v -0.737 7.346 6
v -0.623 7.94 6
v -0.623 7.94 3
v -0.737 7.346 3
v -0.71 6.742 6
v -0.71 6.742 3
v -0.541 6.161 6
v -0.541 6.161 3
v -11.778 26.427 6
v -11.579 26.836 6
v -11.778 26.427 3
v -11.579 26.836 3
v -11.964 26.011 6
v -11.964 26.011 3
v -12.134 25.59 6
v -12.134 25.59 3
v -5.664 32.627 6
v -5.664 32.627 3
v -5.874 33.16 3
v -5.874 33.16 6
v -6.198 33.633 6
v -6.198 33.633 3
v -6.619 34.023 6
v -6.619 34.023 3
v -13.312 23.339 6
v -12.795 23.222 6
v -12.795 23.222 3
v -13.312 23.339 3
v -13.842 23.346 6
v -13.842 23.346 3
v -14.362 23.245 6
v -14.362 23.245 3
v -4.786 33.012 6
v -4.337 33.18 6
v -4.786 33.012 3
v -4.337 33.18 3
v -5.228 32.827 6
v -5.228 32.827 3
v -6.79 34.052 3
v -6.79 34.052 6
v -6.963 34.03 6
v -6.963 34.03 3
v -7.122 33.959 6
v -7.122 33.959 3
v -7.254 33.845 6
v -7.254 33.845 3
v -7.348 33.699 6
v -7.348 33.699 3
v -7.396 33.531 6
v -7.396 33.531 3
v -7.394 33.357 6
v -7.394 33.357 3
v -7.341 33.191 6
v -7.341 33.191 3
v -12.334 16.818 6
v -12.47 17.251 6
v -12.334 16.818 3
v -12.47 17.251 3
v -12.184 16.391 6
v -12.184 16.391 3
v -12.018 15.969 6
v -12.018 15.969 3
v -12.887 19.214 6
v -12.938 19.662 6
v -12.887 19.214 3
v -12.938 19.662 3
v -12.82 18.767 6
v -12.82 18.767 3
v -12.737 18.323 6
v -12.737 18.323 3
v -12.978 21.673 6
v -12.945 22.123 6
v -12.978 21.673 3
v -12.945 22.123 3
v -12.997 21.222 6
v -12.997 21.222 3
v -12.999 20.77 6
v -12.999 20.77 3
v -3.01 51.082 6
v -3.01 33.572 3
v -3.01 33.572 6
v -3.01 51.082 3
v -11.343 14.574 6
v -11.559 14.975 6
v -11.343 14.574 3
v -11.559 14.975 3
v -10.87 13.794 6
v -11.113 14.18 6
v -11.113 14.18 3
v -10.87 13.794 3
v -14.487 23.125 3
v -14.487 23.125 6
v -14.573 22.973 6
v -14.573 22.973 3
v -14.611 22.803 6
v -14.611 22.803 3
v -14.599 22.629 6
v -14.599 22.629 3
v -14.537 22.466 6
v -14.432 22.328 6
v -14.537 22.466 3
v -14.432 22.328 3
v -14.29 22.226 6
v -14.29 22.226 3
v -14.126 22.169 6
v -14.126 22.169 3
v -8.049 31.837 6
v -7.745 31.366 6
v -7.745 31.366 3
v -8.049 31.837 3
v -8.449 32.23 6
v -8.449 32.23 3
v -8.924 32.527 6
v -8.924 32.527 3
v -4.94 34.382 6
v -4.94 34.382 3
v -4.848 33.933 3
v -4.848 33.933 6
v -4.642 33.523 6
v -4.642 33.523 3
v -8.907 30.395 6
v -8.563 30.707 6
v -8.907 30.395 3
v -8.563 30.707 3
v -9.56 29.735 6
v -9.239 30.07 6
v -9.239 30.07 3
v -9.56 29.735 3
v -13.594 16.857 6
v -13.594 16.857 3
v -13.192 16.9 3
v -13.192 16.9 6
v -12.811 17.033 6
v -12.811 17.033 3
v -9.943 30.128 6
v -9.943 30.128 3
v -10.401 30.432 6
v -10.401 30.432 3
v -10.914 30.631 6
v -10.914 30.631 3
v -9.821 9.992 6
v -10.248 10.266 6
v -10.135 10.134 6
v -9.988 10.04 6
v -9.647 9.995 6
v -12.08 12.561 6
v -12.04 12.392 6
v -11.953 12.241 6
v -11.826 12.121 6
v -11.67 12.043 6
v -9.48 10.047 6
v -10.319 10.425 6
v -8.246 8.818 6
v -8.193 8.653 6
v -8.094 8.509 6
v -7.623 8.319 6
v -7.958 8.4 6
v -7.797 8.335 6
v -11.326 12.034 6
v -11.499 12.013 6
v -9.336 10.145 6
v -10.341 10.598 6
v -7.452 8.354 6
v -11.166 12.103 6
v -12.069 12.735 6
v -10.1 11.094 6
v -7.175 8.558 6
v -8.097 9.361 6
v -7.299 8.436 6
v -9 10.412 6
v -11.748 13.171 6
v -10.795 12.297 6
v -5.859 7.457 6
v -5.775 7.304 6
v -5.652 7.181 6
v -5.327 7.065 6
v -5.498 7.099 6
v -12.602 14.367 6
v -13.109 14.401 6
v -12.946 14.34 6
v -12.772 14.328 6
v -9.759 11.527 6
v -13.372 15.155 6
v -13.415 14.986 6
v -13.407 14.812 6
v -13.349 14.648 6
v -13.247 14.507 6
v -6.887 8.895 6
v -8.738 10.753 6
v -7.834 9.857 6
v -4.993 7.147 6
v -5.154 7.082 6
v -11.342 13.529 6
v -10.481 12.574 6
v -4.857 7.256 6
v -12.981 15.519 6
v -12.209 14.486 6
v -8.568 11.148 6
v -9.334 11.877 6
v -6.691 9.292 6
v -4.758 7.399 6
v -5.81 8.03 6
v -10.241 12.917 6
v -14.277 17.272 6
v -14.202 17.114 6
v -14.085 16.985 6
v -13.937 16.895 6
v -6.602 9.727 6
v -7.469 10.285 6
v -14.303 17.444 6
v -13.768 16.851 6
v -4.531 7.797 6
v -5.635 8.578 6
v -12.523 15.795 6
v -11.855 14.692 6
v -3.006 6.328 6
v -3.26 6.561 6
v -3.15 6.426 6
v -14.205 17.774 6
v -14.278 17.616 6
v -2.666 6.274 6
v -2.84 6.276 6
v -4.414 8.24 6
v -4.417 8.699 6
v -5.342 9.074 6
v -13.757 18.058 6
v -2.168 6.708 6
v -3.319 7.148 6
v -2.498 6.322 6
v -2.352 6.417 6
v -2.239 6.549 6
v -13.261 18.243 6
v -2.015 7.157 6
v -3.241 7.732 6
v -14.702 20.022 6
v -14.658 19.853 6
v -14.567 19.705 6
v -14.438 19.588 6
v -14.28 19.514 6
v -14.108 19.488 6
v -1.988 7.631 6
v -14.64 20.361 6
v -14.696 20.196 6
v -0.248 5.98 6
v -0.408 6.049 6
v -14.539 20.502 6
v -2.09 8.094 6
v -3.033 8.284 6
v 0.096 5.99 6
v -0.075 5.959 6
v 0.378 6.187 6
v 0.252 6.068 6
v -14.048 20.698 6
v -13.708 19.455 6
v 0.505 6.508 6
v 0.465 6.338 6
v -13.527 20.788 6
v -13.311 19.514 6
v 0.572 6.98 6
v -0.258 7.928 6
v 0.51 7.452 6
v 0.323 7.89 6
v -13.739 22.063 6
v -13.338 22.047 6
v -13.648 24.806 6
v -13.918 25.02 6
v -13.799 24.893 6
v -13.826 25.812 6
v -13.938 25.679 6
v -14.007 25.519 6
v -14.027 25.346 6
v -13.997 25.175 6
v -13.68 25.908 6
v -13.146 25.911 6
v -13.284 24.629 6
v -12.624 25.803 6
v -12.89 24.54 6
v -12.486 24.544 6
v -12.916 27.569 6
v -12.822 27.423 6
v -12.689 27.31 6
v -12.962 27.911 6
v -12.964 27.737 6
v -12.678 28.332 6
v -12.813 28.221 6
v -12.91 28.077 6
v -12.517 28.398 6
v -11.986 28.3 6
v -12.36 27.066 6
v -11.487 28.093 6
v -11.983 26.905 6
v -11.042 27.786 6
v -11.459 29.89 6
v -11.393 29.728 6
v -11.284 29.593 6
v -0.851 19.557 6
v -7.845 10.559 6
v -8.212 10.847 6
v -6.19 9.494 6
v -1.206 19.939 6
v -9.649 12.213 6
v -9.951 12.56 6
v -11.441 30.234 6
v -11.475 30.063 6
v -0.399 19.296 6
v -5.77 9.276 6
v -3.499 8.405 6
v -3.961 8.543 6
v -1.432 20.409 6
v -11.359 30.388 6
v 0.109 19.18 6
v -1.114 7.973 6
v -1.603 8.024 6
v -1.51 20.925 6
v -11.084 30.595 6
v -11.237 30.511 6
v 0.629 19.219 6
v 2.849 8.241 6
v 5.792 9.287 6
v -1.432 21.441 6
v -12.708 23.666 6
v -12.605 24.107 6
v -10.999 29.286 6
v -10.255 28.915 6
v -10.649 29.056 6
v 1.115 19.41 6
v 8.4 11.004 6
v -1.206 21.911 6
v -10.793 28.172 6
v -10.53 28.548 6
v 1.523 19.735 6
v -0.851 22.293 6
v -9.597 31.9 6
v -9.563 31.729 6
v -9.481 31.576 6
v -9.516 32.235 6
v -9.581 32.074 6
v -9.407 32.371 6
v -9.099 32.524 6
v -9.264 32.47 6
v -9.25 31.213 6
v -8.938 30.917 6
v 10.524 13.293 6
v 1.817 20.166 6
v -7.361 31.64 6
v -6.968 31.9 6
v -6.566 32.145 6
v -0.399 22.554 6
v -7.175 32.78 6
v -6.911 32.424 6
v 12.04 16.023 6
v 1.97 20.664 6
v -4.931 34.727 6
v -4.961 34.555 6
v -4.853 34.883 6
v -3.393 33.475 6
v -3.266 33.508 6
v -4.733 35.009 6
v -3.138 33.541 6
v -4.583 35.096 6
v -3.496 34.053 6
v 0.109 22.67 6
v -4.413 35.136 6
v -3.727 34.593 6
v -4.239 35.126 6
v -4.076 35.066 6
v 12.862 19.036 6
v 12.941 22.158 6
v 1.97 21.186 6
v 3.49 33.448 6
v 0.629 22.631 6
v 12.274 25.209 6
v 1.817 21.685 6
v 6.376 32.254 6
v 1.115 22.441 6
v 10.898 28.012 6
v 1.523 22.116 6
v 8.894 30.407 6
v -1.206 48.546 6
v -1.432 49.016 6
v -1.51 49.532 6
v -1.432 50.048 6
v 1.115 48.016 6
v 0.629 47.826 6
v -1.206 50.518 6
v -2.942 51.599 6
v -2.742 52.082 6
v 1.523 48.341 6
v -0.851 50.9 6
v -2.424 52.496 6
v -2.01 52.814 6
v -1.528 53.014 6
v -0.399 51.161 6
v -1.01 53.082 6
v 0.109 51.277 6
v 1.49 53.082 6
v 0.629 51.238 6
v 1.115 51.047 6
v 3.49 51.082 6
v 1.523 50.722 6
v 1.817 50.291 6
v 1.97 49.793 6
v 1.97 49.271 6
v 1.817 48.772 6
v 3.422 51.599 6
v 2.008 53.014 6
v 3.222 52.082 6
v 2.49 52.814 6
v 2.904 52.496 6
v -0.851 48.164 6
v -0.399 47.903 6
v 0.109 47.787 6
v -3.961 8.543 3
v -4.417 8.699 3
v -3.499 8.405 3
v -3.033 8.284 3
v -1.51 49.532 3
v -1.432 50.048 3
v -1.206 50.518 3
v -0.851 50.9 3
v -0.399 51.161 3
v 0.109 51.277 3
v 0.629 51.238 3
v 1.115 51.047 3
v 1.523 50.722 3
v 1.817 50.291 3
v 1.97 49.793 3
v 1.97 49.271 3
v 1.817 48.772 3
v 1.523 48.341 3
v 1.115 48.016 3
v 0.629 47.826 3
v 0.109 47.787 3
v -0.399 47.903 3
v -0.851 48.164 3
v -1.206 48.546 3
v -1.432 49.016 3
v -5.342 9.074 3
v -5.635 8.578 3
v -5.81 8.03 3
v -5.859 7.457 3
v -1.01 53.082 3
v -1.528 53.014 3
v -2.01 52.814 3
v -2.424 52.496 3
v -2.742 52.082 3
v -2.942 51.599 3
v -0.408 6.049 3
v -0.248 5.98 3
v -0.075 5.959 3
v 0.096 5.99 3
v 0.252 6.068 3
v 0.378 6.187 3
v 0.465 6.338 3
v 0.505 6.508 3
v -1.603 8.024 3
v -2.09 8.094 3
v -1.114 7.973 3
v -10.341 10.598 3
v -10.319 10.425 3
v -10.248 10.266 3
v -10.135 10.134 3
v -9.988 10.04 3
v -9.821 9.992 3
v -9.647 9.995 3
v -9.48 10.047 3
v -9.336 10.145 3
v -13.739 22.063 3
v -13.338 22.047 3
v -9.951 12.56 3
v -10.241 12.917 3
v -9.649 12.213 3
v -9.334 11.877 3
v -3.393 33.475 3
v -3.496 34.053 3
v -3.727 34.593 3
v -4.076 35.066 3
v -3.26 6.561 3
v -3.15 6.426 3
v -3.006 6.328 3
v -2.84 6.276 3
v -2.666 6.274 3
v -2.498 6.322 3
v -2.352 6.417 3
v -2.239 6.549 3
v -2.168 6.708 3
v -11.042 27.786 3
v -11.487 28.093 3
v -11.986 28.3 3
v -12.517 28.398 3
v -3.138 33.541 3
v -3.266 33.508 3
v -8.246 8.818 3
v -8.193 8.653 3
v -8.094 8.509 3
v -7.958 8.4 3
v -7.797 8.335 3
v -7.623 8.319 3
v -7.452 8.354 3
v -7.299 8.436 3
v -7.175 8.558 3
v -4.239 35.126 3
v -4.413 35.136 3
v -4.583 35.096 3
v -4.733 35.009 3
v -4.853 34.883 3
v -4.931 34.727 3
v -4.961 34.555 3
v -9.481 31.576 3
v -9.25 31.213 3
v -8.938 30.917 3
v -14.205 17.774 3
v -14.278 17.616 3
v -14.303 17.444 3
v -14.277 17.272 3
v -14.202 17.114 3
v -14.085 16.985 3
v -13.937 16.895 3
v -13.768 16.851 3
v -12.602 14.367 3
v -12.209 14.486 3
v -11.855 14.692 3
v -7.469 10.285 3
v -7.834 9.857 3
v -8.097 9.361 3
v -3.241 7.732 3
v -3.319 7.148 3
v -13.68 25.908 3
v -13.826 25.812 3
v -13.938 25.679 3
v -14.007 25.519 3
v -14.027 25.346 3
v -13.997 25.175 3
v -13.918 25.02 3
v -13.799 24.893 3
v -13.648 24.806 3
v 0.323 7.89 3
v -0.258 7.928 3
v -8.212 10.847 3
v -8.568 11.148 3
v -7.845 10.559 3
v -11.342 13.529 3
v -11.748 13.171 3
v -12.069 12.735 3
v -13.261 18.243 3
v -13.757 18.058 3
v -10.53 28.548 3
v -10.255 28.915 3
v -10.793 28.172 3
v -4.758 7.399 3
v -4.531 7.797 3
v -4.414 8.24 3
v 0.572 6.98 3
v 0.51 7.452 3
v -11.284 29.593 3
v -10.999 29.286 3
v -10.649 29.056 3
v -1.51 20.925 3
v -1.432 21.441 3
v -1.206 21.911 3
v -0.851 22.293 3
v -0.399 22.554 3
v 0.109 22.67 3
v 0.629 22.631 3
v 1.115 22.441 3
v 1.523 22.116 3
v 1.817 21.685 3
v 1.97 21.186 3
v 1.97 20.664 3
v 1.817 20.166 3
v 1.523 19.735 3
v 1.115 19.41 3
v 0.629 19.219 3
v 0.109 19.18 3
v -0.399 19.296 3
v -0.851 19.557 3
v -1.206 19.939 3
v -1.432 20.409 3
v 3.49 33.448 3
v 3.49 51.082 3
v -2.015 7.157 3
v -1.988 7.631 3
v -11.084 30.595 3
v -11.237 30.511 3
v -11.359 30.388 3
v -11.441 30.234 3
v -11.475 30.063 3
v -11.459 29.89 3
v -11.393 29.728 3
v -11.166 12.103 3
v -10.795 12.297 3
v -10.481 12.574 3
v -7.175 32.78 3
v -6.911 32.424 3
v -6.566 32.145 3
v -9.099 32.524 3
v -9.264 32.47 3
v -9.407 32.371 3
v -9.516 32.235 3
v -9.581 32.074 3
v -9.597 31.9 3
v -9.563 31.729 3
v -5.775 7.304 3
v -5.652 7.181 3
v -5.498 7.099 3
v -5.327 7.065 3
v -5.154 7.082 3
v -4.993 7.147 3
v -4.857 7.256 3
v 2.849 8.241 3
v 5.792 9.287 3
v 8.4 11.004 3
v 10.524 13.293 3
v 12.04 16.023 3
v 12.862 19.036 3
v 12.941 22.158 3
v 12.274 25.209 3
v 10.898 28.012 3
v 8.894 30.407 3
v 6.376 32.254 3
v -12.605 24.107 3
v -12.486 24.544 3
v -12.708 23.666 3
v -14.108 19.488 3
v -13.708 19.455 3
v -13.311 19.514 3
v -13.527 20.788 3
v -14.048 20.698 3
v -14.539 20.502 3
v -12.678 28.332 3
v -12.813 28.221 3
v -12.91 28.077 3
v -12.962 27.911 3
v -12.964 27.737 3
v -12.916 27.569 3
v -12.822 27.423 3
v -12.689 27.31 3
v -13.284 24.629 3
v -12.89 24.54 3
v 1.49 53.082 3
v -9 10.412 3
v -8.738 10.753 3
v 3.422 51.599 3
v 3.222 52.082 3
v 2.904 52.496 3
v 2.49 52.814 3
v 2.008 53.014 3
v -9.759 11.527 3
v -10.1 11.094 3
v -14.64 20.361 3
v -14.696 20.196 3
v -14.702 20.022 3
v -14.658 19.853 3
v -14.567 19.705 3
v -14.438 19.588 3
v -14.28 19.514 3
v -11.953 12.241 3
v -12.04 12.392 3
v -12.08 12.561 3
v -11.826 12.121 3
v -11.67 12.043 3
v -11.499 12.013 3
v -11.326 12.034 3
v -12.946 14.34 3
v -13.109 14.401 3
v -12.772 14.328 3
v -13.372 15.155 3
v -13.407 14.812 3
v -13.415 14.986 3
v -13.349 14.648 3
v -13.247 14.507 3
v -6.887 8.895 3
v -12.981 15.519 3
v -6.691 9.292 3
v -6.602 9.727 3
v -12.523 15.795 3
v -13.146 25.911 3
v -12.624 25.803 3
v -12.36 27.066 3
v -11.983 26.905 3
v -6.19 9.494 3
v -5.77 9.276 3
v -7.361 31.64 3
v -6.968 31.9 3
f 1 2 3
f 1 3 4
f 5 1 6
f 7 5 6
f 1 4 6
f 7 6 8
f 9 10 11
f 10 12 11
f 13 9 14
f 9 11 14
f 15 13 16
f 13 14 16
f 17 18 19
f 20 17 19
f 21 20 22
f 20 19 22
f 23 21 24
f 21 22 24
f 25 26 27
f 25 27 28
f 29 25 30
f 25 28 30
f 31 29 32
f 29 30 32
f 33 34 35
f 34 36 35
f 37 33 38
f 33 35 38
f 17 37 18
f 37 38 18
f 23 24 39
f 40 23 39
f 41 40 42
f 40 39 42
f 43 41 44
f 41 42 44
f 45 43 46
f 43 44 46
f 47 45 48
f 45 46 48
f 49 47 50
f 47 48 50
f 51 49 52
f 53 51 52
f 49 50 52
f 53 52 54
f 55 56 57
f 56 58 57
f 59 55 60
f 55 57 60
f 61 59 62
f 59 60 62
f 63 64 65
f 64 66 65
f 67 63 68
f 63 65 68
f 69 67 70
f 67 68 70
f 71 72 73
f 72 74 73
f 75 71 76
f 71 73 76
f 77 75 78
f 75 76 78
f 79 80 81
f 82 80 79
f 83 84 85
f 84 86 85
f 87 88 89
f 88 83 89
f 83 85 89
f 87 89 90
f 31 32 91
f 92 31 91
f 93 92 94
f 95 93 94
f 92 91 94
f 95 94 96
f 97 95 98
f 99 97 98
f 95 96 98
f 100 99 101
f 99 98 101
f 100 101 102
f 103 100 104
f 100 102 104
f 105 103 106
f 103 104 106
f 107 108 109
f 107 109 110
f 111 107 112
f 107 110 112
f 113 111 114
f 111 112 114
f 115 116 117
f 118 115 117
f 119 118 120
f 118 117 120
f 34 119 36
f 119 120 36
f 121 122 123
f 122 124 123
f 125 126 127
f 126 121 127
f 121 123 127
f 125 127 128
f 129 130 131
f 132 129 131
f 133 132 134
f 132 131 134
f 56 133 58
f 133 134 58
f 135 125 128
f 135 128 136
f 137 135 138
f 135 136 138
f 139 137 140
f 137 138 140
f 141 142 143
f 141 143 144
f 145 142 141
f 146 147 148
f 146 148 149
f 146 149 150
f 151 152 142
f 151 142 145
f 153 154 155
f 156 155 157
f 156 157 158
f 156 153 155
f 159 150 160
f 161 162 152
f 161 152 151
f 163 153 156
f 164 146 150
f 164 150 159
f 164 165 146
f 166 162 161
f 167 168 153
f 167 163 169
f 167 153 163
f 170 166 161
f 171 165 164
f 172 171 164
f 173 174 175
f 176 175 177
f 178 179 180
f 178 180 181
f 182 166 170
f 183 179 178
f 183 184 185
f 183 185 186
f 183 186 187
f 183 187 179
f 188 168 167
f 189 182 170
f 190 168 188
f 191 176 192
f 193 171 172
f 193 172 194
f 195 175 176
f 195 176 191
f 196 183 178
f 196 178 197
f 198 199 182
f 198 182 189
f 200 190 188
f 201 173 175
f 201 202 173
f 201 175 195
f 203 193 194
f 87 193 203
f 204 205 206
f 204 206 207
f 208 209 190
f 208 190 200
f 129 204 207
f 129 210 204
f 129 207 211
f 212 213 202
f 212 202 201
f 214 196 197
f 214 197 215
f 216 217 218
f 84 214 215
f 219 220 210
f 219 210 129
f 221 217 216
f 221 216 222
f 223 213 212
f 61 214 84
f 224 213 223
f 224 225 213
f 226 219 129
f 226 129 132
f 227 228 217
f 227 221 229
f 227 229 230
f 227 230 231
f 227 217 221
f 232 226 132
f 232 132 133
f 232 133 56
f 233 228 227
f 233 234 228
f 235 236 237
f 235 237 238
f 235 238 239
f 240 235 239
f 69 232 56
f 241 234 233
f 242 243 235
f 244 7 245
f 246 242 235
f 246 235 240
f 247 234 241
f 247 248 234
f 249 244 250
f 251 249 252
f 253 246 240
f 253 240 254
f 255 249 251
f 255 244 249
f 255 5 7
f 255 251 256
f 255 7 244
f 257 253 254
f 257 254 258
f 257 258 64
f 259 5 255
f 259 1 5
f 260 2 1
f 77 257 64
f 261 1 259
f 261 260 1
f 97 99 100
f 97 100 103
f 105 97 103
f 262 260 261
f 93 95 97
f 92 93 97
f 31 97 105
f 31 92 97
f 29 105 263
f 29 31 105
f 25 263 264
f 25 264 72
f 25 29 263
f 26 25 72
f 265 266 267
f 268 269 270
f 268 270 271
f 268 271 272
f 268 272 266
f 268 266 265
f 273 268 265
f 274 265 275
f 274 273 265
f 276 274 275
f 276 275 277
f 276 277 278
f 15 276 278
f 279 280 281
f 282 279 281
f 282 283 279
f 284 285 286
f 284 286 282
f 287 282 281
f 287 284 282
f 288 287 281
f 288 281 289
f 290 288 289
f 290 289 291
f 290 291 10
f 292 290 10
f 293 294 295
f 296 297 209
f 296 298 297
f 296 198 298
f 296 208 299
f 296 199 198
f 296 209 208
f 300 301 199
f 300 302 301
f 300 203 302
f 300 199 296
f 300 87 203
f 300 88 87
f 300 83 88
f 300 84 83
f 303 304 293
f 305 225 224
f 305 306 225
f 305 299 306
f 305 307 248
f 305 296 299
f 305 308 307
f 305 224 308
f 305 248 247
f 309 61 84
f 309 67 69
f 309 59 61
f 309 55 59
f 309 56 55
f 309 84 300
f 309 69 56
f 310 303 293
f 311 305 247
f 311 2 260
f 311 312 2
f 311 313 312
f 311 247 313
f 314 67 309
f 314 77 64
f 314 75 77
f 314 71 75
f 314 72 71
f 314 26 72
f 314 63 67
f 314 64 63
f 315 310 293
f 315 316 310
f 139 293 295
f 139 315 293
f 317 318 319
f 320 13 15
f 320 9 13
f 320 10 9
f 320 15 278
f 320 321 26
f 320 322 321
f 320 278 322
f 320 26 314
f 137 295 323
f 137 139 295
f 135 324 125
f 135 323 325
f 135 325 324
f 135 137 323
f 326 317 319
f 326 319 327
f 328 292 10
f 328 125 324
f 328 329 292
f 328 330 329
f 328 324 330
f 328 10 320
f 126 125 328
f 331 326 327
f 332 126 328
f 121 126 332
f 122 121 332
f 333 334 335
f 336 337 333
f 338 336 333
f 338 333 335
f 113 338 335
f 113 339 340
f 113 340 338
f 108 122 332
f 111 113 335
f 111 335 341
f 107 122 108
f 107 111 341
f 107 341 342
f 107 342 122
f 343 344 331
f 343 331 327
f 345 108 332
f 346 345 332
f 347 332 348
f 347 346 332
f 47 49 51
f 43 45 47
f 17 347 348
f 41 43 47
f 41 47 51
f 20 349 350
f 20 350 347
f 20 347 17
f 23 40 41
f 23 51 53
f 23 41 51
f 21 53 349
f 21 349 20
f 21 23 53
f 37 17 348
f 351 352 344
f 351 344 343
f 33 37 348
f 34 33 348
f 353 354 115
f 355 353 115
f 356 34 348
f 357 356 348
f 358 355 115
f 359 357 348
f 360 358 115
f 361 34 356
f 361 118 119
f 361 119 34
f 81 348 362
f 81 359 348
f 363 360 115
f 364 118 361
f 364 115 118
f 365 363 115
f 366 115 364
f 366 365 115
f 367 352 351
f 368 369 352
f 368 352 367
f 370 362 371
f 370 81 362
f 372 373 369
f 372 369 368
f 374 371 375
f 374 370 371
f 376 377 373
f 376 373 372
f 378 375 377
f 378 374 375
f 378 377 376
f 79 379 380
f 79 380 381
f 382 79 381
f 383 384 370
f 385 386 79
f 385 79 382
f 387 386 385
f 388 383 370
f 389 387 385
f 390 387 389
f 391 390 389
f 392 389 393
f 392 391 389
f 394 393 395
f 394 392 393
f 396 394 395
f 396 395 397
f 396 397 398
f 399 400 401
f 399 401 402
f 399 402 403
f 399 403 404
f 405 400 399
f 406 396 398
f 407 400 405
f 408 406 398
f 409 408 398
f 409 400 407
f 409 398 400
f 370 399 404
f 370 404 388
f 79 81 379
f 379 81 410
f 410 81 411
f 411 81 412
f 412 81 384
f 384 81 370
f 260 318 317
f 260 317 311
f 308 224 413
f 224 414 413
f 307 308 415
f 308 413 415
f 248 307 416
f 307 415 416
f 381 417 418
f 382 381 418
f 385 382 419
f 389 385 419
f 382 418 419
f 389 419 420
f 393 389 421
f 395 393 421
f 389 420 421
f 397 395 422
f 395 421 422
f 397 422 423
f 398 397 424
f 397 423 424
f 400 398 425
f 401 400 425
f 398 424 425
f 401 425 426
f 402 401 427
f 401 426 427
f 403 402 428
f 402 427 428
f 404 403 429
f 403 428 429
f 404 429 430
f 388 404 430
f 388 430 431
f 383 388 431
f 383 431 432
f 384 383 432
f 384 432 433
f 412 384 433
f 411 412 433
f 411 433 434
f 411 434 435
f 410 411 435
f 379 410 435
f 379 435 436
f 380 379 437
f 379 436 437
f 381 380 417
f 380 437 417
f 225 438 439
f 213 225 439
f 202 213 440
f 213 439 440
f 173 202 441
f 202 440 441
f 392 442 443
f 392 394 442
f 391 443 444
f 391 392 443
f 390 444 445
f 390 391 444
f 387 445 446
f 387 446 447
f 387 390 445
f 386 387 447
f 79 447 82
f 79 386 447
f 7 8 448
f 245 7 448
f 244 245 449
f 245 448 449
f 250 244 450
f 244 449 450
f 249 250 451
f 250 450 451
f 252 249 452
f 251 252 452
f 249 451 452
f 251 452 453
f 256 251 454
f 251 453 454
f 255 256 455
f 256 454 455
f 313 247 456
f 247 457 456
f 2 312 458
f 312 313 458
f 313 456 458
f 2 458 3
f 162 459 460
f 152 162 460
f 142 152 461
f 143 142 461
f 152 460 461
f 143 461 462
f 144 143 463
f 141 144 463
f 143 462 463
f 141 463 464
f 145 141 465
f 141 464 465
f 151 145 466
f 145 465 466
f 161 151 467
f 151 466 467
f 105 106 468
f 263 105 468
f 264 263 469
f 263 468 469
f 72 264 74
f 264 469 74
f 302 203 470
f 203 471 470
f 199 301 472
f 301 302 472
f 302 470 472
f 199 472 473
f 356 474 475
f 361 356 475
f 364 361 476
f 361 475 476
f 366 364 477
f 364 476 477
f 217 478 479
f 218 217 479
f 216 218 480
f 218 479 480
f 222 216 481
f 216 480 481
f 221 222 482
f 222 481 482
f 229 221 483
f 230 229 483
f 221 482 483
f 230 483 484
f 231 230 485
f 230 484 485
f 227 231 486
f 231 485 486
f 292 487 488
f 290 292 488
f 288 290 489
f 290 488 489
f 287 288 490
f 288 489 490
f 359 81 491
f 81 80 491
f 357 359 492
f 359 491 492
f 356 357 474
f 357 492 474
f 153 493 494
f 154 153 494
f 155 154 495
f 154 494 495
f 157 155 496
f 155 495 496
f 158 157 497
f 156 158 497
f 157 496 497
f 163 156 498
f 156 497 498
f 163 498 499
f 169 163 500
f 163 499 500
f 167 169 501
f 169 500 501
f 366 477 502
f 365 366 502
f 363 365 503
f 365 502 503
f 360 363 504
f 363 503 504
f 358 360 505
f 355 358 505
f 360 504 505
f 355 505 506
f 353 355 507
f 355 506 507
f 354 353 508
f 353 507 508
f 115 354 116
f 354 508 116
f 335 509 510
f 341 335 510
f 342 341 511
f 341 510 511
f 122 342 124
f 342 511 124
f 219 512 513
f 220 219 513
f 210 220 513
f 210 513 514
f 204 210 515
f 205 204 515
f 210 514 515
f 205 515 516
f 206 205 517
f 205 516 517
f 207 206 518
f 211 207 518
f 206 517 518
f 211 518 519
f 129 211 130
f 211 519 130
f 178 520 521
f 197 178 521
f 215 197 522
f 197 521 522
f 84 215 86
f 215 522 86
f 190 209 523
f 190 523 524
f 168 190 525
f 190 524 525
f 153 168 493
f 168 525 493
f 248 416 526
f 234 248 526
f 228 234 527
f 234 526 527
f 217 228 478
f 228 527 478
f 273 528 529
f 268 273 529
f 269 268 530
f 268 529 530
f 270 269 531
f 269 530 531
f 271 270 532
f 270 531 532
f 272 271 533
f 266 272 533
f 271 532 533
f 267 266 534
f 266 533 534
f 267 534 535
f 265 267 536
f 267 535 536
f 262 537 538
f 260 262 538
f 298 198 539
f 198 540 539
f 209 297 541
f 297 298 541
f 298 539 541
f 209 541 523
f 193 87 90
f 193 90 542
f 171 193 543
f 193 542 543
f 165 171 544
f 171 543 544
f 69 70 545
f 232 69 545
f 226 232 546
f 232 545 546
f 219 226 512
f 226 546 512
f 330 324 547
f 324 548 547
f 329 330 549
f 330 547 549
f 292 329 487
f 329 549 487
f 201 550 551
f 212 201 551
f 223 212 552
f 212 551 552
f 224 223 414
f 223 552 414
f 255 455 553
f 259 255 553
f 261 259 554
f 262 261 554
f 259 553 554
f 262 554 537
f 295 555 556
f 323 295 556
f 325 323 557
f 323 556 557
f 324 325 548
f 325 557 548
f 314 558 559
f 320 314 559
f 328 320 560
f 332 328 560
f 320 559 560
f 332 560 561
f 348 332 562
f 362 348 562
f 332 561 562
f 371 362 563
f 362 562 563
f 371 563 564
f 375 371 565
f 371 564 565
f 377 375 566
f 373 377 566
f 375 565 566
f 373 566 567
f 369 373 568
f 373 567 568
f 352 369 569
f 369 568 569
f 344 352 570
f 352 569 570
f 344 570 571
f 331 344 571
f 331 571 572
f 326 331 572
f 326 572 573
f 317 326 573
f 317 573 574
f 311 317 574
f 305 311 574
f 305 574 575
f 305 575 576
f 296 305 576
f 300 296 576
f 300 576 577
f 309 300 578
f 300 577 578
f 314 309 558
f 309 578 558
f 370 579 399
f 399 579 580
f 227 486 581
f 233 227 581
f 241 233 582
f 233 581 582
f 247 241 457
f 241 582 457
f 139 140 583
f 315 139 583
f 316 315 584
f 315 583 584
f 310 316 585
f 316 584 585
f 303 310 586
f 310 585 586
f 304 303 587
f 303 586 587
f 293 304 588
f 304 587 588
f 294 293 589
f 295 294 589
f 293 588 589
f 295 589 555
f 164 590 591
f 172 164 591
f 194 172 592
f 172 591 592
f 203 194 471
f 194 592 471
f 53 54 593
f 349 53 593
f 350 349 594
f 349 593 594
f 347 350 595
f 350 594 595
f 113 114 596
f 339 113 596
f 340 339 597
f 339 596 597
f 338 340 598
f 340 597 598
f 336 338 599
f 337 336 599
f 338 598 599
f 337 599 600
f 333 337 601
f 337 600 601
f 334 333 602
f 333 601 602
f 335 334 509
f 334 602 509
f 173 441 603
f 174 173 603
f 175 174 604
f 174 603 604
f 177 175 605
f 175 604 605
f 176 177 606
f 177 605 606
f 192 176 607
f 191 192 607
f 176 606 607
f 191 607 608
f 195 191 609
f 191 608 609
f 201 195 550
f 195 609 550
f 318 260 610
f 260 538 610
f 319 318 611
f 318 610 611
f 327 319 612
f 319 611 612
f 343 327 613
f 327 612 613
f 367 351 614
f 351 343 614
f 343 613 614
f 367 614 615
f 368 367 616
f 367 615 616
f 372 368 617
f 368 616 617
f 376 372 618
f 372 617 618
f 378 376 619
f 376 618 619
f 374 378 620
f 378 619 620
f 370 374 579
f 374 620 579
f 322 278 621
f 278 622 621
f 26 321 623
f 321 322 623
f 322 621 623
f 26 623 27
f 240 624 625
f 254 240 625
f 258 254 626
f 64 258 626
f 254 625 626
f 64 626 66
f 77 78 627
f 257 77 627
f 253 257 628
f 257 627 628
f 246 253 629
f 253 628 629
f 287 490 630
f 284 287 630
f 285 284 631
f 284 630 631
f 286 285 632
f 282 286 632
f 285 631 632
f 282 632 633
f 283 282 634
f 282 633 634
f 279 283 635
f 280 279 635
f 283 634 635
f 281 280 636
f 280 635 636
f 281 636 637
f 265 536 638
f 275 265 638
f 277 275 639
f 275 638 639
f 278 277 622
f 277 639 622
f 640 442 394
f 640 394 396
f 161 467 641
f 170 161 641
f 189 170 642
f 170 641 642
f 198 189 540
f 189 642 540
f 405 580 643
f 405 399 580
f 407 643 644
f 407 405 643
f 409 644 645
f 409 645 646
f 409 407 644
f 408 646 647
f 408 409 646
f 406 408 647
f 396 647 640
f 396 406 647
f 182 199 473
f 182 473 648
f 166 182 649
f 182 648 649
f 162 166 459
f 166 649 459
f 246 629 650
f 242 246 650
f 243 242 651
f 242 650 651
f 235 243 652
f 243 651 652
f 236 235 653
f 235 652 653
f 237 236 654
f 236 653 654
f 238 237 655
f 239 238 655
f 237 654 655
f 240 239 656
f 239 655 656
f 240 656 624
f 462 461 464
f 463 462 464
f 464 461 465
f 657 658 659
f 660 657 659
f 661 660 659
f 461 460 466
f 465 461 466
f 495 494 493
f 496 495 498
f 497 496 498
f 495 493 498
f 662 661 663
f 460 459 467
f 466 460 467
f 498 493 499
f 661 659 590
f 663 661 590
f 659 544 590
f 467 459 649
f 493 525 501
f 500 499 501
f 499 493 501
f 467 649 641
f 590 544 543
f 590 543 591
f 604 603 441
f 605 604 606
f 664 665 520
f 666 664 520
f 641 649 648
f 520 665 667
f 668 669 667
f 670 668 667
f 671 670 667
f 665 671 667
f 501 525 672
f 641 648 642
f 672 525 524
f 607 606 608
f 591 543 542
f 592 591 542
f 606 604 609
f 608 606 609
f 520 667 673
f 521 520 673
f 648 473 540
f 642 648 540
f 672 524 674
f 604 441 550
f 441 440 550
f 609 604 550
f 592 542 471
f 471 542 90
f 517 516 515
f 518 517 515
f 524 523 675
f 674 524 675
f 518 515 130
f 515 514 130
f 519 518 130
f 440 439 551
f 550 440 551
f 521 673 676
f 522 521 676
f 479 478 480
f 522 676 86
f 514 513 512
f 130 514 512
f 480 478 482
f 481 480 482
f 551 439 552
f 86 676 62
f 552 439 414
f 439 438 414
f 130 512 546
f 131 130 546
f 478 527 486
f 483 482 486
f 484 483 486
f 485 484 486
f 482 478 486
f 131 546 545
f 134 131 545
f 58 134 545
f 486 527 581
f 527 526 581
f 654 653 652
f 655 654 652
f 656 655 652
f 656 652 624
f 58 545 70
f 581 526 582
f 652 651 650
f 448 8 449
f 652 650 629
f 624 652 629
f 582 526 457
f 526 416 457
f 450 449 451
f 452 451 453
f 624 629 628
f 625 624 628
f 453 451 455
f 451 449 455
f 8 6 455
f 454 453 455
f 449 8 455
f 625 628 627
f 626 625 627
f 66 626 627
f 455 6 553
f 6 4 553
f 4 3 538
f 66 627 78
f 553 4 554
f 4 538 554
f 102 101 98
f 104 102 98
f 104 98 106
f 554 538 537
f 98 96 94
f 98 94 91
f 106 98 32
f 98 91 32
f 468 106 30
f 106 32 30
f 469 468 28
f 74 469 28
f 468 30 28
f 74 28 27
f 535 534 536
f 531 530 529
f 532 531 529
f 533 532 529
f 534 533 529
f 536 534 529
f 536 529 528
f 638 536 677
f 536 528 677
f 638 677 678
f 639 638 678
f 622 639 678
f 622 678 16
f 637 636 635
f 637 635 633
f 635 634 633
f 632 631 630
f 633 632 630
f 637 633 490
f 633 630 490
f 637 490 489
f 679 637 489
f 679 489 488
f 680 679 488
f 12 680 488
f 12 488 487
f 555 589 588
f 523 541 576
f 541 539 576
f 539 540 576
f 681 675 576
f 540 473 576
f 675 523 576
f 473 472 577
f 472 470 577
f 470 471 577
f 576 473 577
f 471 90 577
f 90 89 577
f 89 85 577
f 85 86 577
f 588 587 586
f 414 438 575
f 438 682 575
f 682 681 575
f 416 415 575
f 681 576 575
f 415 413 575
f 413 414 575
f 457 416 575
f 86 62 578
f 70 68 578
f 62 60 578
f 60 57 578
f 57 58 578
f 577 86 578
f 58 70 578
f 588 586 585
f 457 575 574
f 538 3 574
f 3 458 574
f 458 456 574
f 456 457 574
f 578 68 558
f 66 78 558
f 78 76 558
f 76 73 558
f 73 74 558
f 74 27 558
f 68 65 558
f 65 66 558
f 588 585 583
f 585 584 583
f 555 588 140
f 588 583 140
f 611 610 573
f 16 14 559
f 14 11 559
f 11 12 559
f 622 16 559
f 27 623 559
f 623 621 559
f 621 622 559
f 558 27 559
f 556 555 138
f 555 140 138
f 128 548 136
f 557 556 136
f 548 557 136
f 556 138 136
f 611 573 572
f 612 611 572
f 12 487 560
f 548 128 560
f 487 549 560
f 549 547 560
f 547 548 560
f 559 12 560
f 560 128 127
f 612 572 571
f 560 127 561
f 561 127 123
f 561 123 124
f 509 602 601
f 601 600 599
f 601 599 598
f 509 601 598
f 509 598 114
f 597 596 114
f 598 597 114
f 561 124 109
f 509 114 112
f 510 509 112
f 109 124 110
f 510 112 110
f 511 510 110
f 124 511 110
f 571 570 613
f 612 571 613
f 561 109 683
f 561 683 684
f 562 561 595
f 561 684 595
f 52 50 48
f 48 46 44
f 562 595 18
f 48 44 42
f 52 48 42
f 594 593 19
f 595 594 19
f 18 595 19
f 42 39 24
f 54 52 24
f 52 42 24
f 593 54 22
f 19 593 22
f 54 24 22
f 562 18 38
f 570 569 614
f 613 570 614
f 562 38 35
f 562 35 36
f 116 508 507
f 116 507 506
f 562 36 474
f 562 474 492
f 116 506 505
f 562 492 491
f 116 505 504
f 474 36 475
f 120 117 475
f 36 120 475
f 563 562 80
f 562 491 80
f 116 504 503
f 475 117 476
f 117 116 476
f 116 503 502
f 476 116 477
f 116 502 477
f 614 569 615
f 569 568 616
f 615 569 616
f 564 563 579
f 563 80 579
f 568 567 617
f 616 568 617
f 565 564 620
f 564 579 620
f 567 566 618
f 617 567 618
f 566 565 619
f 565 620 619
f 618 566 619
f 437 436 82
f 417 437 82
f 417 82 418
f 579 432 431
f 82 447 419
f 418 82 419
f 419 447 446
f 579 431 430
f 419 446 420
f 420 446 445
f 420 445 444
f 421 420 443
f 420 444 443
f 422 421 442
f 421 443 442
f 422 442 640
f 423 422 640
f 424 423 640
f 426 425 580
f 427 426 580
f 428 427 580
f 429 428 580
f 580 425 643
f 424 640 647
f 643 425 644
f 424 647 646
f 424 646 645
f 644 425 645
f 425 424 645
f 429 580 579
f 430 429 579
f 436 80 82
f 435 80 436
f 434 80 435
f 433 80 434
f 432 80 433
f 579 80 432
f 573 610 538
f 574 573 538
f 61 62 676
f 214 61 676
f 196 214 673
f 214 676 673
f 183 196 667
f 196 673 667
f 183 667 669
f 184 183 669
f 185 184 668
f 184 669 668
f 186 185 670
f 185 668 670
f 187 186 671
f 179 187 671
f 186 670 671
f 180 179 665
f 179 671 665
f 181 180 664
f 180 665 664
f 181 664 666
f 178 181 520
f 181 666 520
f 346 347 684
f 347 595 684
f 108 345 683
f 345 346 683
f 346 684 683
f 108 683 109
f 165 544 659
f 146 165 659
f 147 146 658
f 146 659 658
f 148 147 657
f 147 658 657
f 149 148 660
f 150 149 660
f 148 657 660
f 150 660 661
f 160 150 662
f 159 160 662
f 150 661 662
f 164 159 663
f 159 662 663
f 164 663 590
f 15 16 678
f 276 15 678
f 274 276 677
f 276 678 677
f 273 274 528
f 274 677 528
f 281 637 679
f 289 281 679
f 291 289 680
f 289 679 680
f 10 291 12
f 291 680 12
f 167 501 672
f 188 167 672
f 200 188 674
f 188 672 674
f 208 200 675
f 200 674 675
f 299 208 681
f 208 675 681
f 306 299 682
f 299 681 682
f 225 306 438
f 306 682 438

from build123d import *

# Parameters (mm, degrees)
SKETCH5_R           = 13
BOSS_EXTRUDE3_DEPTH = 3
SKETCH6_W           = 6.5
SKETCH6_H           = 20
BOSS_EXTRUDE4_DEPTH = 3
BOSS_EXTRUDE5_DEPTH = 3
SKETCH9_R           = 1.75
CUT_EXTRUDE1_DEPTH  = 3
FILLET1_R           = 2


with BuildPart() as part:
    # Sketch5 → Boss-Extrude3 (new body)
    with BuildSketch(Plane.XY.offset(3)):
        with Locations((0, 20.92523633)):
            Circle(SKETCH5_R)
    extrude(amount=BOSS_EXTRUDE3_DEPTH)

    # Sketch6 → Boss-Extrude4 (add)
    with BuildSketch(Plane.XY.offset(3)):
        with Locations((0.239986303, 43.081718219)):
            Rectangle(SKETCH6_W, SKETCH6_H)
    extrude(amount=BOSS_EXTRUDE4_DEPTH)

    # Sketch8 → Boss-Extrude5 (add)
    with BuildSketch(Plane.XY.offset(3)):
        with BuildLine():
            Line((-4.295994306, 33.146239501), (-3.38996239, 33.41049881))
            ThreePointArc((-3.38996239, 33.41049881), (-3.583611793, 34.300219718), (-4.075784869, 35.066293507))
            ThreePointArc((-4.075784869, 35.066293507), (-4.733344139, 35.009325085), (-4.939904397, 34.382457909))
            ThreePointArc((-4.939904397, 34.382457909), (-4.746199027, 33.697547192), (-4.295994306, 33.146239501))
        make_face()
        with BuildLine():
            Line((-6.479661136, 32.095481488), (-5.638197922, 32.522876474))
            ThreePointArc((-5.638197922, 32.522876474), (-5.993184011, 33.36138006), (-6.618649024, 34.023117852))
            ThreePointArc((-6.618649024, 34.023117852), (-7.254301529, 33.845422924), (-7.341262628, 33.191154353))
            ThreePointArc((-7.341262628, 33.191154353), (-7.024130865, 32.55393233), (-6.479661136, 32.095481488))
        make_face()
        with BuildLine():
            Line((-8.431105641, 30.65869425), (-7.68329101, 31.234454696))
            ThreePointArc((-7.68329101, 31.234454696), (-8.187345926, 31.992763359), (-8.924487613, 32.527296351))
            ThreePointArc((-8.924487613, 32.527296351), (-9.516266026, 32.235015826), (-9.480622702, 31.575956535))
            ThreePointArc((-9.480622702, 31.575956535), (-9.05102421, 31.008444775), (-8.431105641, 30.65869425))
        make_face()
        with BuildLine():
            Line((-10.082888425, 28.885531296), (-9.454565882, 29.589759666))
            ThreePointArc((-9.454565882, 29.589759666), (-10.090270139, 30.241667239), (-10.913613837, 30.630522663))
            ThreePointArc((-10.913613837, 30.630522663), (-11.44106706, 30.233757376), (-11.284051101, 29.592683602))
            ThreePointArc((-11.284051101, 29.592683602), (-10.756832248, 29.114494578), (-10.082888425, 28.885531296))
        make_face()
        with BuildLine():
            Line((-11.377926009, 26.837270843), (-10.89080957, 27.645629915))
            ThreePointArc((-10.89080957, 27.645629915), (-11.63619405, 28.168607317), (-12.517286067, 28.398346832))
            ThreePointArc((-12.517286067, 28.398346832), (-12.962185999, 27.910808479), (-12.689223673, 27.309874902))
            ThreePointArc((-12.689223673, 27.309874902), (-12.08260446, 26.937534209), (-11.377926009, 26.837270843))
        make_face()
        with BuildLine():
            Line((-12.271463571, 24.584698125), (-11.942387349, 25.469252055))
            ThreePointArc((-11.942387349, 25.469252055), (-12.77169253, 25.845225862), (-13.680083464, 25.907909968))
            ThreePointArc((-13.680083464, 25.907909968), (-14.027054939, 25.346447244), (-13.647579472, 24.806421351))
            ThreePointArc((-13.647579472, 24.806421351), (-12.982523874, 24.5527966), (-12.271463571, 24.584698125))
        make_face()
        with BuildLine():
            Line((-12.732621608, 22.20565914), (-12.572958051, 23.135838888))
            ThreePointArc((-12.572958051, 23.135838888), (-13.457524218, 23.351815933), (-14.361821254, 23.245278348))
            ThreePointArc((-14.361821254, 23.245278348), (-14.598873387, 22.629294678), (-14.125998959, 22.168839065))
            ThreePointArc((-14.125998959, 22.168839065), (-13.425490439, 22.042695201), (-12.732621608, 22.20565914))
        make_face()
        with BuildLine():
            Line((-12.745463094, 19.782370399), (-12.76072997, 20.726030156))
            ThreePointArc((-12.76072997, 20.726030156), (-13.669987659, 20.774546551), (-14.538939462, 20.502469076))
            ThreePointArc((-14.538939462, 20.502469076), (-14.657880036, 19.853252059), (-14.107948577, 19.488279478))
            ThreePointArc((-14.107948577, 19.488279478), (-13.396195802, 19.493975869), (-12.745463094, 19.782370399))
        make_face()
        with BuildLine():
            Line((-12.309544245, 17.398577627), (-12.499213949, 18.323105732))
            ThreePointArc((-12.499213949, 18.323105732), (-13.401740392, 18.202484813), (-14.20531711, 17.774270094))
            ThreePointArc((-14.20531711, 17.774270094), (-14.202035694, 17.114255831), (-13.594052123, 16.857379261))
            ThreePointArc((-13.594052123, 16.857379261), (-12.895652349, 16.994719047), (-12.309544245, 17.398577627))
        make_face()
        with BuildLine():
            Line((-11.439929852, 15.136661617), (-11.797447644, 16.010107576))
            ThreePointArc((-11.797447644, 16.010107576), (-12.662052694, 15.724517845), (-13.372483756, 15.154964429))
            ThreePointArc((-13.372483756, 15.154964429), (-13.247093752, 14.506962159), (-12.602069194, 14.367058922))
            ThreePointArc((-12.602069194, 14.367058922), (-11.941158214, 14.631295818), (-11.439929852, 15.136661617))
        make_face()
        with BuildLine():
            Line((-10.166672663, 13.074791263), (-10.679683192, 13.866969912))
            ThreePointArc((-10.679683192, 13.866969912), (-11.476487216, 13.426280982), (-12.069221043, 12.735071898))
            ThreePointArc((-12.069221043, 12.735071898), (-11.826055767, 12.121475741), (-11.166281438, 12.103380713))
            ThreePointArc((-11.166281438, 12.103380713), (-10.565699479, 12.485383033), (-10.166672663, 13.074791263))
        make_face()
        with BuildLine():
            Line((-8.533774801, 11.284222136), (-9.184549085, 11.967756807))
            ThreePointArc((-9.184549085, 11.967756807), (-9.886015568, 11.387198317), (-10.340568045, 10.598220857))
            ThreePointArc((-10.340568045, 10.598220857), (-9.988030974, 10.040235902), (-9.336307821, 10.144574423))
            ThreePointArc((-9.336307821, 10.144574423), (-8.816810221, 10.631140662), (-8.533774801, 11.284222136))
        make_face()
        with BuildLine():
            Line((-6.597667103, 9.826833991), (-7.363715226, 10.378102608))
            ThreePointArc((-7.363715226, 10.378102608), (-7.945602392, 9.677737908), (-8.246264774, 8.818258113))
            ThreePointArc((-8.246264774, 8.818258113), (-7.796539134, 8.3351676), (-7.175389866, 8.558333865))
            ThreePointArc((-7.175389866, 8.558333865), (-6.754929788, 9.132648922), (-6.597667103, 9.826833991))
        make_face()
        with BuildLine():
            Line((-4.425258947, 8.752992275), (-5.280107276, 9.152943708))
            ThreePointArc((-5.280107276, 9.152943708), (-5.722305859, 8.356976498), (-5.858687642, 7.456696877))
            ThreePointArc((-5.858687642, 7.456696877), (-5.327315369, 7.065195788), (-4.758206101, 7.399477461))
            ThreePointArc((-4.758206101, 7.399477461), (-4.451314103, 8.041693751), (-4.425258947, 8.752992275))
        make_face()
        with BuildLine():
            Line((-2.091625949, 8.09980757), (-3.005732032, 8.334620015))
            ThreePointArc((-3.005732032, 8.334620015), (-3.292960219, 7.470557891), (-3.260348227, 6.560590944))
            ThreePointArc((-3.260348227, 6.560590944), (-2.665692859, 6.274209051), (-2.168291272, 6.708053788))
            ThreePointArc((-2.168291272, 6.708053788), (-1.985573144, 7.395977147), (-2.091625949, 8.09980757))
        make_face()
        with BuildLine():
            Line((0.322584552, 7.889853094), (-0.61918896, 7.951411738))
            ThreePointArc((-0.61918896, 7.951411738), (-0.741520518, 7.049115568), (-0.541041777, 6.160908576))
            ThreePointArc((-0.541041777, 6.160908576), (0.096346165, 5.989542866), (0.504850516, 6.507957556))
            ThreePointArc((0.504850516, 6.507957556), (0.557080271, 7.217814242), (0.322584552, 7.889853094))
        make_face()
    extrude(amount=BOSS_EXTRUDE5_DEPTH)

    # Sketch9 → Cut-Extrude1 (cut)
    with BuildSketch(Plane(origin=(0, 0, 3), x_dir=(-1, 0, 0), z_dir=(0, 0, -1))):
        with Locations((-0.239986303, 49.531718219)):
            Circle(SKETCH9_R)
        with Locations((-0.239986303, 20.92523633)):
            Circle(SKETCH9_R)
    extrude(amount=-CUT_EXTRUDE1_DEPTH, mode=Mode.SUBTRACT)

    # Fillet1
    fillet1_edges = [part.edges().sort_by_distance(p)[0] for p in [
        (-3.010013697, 53.081718219, 4.5),
        (3.489986303, 53.081718219, 4.5),
    ]]
    fillet(fillet1_edges, radius=FILLET1_R)


solid = part.part
